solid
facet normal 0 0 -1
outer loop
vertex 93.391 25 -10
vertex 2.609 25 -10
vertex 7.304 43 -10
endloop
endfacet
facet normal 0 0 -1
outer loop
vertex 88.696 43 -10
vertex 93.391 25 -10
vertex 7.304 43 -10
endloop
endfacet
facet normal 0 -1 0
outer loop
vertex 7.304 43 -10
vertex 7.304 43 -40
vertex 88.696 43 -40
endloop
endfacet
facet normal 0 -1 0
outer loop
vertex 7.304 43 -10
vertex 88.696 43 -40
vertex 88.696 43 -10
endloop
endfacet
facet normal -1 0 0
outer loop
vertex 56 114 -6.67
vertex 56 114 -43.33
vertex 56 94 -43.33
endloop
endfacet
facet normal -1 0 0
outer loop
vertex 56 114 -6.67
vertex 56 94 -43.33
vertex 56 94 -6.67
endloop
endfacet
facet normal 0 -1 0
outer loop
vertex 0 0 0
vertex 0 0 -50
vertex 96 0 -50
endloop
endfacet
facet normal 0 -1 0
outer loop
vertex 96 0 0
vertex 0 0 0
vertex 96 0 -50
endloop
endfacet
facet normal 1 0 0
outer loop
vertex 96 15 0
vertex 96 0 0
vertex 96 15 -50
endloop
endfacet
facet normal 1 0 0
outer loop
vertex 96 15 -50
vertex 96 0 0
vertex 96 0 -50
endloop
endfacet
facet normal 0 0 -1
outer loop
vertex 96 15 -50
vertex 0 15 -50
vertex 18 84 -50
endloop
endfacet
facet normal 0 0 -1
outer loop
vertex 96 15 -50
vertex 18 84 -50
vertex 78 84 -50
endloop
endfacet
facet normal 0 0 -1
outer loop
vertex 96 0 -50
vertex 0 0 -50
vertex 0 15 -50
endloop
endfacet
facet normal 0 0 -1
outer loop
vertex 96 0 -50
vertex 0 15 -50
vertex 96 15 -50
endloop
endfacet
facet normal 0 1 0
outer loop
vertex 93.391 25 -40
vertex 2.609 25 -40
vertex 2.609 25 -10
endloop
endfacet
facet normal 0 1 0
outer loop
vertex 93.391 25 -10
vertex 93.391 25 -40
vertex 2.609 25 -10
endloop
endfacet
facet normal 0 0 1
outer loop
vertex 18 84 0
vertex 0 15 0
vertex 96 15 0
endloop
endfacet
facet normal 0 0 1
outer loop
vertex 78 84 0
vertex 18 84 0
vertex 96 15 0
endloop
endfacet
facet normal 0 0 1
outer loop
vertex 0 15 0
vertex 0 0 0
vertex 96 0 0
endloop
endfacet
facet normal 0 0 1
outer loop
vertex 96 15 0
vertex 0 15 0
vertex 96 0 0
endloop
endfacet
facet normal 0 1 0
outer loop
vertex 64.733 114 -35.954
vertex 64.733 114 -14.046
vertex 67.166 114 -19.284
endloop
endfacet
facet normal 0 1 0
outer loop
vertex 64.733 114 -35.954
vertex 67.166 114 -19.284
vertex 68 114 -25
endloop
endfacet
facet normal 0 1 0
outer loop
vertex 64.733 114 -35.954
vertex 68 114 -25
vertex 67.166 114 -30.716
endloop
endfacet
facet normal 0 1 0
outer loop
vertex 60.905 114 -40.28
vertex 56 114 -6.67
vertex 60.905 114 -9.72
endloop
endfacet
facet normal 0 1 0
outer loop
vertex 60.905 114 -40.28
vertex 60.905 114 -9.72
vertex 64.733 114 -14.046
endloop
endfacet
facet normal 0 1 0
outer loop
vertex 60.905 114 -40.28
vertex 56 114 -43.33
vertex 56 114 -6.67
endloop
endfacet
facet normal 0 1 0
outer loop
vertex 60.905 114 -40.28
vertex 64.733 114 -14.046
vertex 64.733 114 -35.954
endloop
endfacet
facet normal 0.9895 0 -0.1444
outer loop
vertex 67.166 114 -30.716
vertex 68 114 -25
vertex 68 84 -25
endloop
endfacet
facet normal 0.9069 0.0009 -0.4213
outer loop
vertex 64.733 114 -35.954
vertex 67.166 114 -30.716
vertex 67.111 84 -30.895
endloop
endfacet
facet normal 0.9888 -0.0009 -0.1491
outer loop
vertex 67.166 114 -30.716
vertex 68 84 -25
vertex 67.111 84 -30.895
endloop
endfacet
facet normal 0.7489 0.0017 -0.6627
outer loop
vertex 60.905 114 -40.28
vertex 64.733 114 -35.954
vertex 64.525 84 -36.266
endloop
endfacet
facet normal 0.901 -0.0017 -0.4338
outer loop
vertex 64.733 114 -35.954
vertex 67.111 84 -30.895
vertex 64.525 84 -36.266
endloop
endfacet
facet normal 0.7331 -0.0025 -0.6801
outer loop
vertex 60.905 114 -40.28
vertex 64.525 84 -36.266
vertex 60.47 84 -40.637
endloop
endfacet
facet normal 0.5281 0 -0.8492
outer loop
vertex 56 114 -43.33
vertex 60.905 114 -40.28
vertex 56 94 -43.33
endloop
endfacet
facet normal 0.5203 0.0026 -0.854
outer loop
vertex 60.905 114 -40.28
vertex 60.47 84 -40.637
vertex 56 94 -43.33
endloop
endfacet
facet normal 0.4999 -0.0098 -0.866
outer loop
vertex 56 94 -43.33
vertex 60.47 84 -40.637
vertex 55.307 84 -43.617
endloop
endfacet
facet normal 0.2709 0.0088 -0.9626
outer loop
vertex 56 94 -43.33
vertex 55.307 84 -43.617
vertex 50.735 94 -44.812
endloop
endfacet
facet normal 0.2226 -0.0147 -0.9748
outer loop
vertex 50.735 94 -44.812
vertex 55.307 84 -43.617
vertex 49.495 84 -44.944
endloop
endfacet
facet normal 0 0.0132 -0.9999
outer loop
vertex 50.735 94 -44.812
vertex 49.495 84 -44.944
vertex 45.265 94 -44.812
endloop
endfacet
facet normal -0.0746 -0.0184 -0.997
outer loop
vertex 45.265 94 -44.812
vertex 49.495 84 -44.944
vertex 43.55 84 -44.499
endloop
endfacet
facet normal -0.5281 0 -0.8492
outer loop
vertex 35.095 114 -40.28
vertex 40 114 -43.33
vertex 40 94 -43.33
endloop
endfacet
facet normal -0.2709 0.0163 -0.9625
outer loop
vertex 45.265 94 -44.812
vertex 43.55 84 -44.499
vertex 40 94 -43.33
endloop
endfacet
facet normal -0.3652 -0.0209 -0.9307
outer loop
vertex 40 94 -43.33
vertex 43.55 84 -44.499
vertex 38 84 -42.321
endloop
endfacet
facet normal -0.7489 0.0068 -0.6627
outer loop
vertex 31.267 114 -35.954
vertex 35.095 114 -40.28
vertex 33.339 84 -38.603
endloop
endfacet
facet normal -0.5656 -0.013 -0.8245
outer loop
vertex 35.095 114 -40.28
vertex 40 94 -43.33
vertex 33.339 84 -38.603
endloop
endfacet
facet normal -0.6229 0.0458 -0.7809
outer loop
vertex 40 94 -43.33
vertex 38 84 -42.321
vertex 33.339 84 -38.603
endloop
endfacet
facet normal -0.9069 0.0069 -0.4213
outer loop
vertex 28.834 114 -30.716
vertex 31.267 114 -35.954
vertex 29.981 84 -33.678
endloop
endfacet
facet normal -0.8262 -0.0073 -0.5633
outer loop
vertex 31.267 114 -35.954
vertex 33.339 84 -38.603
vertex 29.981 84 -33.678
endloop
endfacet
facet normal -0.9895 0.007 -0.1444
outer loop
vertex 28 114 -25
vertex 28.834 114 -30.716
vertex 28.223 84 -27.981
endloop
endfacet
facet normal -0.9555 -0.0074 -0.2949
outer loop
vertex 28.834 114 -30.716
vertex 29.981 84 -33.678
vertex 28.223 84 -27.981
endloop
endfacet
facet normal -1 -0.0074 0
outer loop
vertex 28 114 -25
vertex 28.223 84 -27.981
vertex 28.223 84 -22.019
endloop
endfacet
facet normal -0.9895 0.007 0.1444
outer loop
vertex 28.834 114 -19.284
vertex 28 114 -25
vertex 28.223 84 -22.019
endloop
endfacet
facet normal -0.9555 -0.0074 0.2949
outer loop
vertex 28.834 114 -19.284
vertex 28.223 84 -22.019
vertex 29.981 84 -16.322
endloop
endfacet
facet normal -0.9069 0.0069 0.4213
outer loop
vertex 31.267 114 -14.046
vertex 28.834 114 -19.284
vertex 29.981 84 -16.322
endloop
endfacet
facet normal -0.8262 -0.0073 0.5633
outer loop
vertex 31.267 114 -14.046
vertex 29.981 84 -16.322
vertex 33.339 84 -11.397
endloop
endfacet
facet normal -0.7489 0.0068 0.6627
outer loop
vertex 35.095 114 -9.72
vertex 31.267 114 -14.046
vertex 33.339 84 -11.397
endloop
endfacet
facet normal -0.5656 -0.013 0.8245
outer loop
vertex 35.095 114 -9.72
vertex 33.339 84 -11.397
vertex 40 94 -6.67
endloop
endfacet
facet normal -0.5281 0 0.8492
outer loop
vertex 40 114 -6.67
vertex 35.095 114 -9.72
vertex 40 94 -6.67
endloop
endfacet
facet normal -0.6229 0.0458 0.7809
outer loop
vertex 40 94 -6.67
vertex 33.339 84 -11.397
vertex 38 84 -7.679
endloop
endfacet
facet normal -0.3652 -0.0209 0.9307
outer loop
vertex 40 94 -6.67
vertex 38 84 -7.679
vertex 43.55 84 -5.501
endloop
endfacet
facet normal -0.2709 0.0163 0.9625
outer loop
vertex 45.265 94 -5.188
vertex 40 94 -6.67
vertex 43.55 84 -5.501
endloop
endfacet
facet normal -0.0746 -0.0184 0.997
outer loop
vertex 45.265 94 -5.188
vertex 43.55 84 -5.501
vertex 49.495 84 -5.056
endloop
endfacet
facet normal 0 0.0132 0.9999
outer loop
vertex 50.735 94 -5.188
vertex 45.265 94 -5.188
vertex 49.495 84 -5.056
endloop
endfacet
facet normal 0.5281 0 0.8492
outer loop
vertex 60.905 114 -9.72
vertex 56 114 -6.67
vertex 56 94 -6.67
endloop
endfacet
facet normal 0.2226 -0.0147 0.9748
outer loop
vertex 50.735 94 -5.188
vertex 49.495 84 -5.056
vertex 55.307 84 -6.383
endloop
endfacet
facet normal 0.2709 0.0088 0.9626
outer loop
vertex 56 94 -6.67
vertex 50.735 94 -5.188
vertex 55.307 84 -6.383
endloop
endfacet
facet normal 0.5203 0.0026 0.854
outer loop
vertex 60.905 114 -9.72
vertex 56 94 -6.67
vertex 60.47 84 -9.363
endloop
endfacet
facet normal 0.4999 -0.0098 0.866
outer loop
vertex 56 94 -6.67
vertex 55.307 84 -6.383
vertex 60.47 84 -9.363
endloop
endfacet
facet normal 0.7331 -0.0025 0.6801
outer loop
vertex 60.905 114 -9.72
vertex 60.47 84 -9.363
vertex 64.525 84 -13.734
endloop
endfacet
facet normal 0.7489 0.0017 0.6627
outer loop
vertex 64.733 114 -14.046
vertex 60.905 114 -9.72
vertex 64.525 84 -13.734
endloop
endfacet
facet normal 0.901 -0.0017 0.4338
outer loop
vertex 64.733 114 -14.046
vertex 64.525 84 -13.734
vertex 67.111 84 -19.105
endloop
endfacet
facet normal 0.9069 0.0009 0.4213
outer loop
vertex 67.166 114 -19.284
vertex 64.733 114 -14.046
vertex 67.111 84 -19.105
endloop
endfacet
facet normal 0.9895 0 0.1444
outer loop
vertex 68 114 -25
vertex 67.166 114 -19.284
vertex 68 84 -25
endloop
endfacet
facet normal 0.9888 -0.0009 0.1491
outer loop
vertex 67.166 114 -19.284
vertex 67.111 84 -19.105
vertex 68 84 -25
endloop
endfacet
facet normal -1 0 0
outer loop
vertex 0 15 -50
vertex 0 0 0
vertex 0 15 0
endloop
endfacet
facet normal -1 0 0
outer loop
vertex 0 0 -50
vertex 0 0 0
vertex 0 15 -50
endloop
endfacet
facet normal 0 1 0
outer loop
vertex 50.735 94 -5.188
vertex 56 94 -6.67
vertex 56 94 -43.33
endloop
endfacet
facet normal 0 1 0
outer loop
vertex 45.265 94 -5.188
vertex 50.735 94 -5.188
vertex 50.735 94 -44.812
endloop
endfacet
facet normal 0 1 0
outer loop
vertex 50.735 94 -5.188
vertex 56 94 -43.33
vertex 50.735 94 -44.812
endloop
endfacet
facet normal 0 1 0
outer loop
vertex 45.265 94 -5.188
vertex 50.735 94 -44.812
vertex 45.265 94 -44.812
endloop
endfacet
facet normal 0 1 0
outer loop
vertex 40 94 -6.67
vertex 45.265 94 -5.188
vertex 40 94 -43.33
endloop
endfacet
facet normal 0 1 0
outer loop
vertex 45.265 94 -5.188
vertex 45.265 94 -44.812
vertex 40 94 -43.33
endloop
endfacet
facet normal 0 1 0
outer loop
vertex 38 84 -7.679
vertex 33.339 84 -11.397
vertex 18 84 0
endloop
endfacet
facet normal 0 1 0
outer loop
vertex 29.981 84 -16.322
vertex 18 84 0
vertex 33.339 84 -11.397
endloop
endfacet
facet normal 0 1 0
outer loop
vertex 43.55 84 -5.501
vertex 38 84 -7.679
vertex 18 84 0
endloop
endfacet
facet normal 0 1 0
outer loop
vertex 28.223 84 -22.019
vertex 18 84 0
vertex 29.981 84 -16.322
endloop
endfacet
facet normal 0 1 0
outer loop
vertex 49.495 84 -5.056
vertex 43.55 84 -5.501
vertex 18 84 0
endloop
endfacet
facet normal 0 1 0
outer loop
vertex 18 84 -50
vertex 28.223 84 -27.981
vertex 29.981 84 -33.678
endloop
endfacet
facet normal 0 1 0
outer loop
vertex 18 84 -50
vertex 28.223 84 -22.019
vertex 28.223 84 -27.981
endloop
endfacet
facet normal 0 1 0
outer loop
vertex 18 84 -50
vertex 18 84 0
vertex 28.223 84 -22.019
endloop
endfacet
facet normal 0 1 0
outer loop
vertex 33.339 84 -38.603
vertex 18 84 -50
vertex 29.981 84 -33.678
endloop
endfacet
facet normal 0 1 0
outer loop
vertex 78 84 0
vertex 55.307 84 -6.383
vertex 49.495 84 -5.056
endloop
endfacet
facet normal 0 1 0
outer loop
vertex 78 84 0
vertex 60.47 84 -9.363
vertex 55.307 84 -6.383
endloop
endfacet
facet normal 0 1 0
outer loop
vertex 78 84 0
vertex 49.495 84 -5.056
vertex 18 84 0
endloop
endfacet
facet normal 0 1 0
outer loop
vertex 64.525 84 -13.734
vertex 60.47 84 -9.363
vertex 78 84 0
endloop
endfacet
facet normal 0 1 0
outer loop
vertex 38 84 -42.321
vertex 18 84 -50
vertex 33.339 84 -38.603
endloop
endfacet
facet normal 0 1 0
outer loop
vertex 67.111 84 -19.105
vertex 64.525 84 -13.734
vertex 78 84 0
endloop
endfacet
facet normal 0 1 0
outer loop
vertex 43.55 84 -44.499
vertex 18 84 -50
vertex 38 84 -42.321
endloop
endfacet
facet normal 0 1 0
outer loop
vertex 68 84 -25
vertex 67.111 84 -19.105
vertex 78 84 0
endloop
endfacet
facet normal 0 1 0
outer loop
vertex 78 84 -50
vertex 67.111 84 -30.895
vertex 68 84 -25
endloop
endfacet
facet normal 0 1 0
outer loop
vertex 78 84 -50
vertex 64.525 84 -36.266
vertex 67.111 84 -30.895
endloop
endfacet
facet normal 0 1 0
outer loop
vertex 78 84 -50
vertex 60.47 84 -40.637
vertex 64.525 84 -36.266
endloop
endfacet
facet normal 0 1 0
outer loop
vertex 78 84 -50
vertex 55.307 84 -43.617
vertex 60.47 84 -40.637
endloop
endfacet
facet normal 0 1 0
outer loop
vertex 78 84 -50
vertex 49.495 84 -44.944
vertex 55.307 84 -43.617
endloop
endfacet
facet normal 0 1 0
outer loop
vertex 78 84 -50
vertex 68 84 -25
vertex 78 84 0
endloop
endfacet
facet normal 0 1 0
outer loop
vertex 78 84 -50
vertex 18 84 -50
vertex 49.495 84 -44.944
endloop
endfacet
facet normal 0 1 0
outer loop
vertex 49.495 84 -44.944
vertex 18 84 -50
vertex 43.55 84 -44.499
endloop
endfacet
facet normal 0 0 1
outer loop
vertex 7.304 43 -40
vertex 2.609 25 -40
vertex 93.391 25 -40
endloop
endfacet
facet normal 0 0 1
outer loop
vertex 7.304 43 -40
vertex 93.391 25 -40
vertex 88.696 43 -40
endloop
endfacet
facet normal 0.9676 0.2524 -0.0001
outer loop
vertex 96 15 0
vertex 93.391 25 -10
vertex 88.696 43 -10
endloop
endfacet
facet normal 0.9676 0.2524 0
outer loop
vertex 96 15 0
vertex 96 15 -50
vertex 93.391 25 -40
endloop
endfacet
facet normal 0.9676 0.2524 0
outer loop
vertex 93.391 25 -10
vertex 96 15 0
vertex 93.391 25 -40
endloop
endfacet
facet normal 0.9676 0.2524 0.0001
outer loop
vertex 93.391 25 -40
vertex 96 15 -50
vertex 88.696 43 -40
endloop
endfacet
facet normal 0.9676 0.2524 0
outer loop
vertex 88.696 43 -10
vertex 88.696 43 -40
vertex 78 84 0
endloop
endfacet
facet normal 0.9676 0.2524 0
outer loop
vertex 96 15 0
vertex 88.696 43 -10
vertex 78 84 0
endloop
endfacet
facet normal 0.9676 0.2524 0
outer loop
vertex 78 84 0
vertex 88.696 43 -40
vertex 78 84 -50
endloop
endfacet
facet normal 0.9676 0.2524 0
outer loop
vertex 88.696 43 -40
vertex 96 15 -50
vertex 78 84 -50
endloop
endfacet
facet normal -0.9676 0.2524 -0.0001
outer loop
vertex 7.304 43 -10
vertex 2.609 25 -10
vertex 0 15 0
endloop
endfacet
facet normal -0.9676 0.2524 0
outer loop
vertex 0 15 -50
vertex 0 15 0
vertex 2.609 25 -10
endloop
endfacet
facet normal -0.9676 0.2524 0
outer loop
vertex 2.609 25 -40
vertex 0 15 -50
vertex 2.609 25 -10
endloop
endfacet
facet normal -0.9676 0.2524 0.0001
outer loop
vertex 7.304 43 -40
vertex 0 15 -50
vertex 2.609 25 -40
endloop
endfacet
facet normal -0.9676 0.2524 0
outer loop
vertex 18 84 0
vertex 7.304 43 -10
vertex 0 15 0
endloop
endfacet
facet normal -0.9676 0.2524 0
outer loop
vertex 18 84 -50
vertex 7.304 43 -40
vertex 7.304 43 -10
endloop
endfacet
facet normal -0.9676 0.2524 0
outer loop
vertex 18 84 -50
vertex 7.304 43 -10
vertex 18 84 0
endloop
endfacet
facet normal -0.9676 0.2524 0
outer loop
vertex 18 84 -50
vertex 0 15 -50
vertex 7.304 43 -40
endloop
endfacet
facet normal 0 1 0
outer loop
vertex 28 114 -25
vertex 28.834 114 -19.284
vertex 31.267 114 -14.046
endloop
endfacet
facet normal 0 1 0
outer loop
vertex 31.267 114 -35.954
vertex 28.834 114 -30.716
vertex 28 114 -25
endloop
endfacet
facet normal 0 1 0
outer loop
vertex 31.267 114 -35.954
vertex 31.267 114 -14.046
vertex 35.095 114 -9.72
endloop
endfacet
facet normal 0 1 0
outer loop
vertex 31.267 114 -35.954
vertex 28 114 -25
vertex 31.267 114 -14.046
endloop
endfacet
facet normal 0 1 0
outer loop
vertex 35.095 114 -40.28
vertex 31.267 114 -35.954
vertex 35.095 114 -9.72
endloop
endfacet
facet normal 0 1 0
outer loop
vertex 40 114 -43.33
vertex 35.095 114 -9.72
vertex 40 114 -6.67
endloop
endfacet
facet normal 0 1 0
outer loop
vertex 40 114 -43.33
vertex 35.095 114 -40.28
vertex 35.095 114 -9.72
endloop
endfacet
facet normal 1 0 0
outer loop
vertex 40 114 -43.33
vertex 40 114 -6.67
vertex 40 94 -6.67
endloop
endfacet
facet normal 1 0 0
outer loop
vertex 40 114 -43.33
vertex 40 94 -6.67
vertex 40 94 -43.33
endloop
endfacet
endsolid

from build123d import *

# Parameters (mm, degrees)
SKETCH1_W           = 96
SKETCH1_H           = 50
BOSS_EXTRUDE1_DEPTH = 84
SKETCH5_W           = 30
SKETCH5_H           = 18
CUT_EXTRUDE2_DEPTH  = 102
CUT_EXTRUDE1_START  = -51
CUT_EXTRUDE1_DEPTH  = 52
SKETCH6_R           = 20
BOSS_EXTRUDE2_DEPTH = 30
CUT_EXTRUDE3_DEPTH  = 20


with BuildPart() as part:
    # Sketch1 → Boss-Extrude1 (new body)
    with BuildSketch(Plane(origin=(0, 0, 0), x_dir=(1, 0, 0), z_dir=(0, 1, 0))):
        with Locations((48, 25)):
            Rectangle(SKETCH1_W, SKETCH1_H)
    extrude(amount=BOSS_EXTRUDE1_DEPTH)

    # Sketch5 → Cut-Extrude2 (cut)
    with BuildSketch(Plane.ZY):
        with Locations((-25, 34)):
            Rectangle(SKETCH5_W, SKETCH5_H)
    extrude(amount=-CUT_EXTRUDE2_DEPTH, mode=Mode.SUBTRACT)

    # Sketch2 → Cut-Extrude1 (cut)
    with BuildSketch(Plane.XY.offset(CUT_EXTRUDE1_START)):
        Polygon((-62.209054952, -223.468043983), (0, 15), (18, 84), (80.209054952, 322.468043983), (-396.727033013, 446.886153886), (-539.145142917, -99.049934079), align=None)
    cut_extrude1 = extrude(amount=CUT_EXTRUDE1_DEPTH, mode=Mode.SUBTRACT)

    # Mirror1: Cut-Extrude1 across plane
    add(cut_extrude1.mirror(Plane.ZY.offset(-48)), mode=Mode.SUBTRACT)

    # Sketch6 → Boss-Extrude2 (add)
    with BuildSketch(Plane(origin=(0, 84, 0), x_dir=(1, 0, 0), z_dir=(0, 1, 0))):
        with Locations((48, 25)):
            Circle(SKETCH6_R)
    extrude(amount=BOSS_EXTRUDE2_DEPTH)

    # Sketch8 → Cut-Extrude3 (cut)
    with BuildSketch(Plane(origin=(0, 114, 0), x_dir=(1, 0, 0), z_dir=(0, 1, 0))):
        with BuildLine():
            Line((40, 6.66969722), (40, 43.33030278))
            ThreePointArc((40, 43.33030278), (48, 45), (56, 43.33030278))
            Line((56, 43.33030278), (56, 6.66969722))
            ThreePointArc((56, 6.66969722), (48, 5), (40, 6.66969722))
        make_face()
    extrude(amount=-CUT_EXTRUDE3_DEPTH, mode=Mode.SUBTRACT)


solid = part.part
